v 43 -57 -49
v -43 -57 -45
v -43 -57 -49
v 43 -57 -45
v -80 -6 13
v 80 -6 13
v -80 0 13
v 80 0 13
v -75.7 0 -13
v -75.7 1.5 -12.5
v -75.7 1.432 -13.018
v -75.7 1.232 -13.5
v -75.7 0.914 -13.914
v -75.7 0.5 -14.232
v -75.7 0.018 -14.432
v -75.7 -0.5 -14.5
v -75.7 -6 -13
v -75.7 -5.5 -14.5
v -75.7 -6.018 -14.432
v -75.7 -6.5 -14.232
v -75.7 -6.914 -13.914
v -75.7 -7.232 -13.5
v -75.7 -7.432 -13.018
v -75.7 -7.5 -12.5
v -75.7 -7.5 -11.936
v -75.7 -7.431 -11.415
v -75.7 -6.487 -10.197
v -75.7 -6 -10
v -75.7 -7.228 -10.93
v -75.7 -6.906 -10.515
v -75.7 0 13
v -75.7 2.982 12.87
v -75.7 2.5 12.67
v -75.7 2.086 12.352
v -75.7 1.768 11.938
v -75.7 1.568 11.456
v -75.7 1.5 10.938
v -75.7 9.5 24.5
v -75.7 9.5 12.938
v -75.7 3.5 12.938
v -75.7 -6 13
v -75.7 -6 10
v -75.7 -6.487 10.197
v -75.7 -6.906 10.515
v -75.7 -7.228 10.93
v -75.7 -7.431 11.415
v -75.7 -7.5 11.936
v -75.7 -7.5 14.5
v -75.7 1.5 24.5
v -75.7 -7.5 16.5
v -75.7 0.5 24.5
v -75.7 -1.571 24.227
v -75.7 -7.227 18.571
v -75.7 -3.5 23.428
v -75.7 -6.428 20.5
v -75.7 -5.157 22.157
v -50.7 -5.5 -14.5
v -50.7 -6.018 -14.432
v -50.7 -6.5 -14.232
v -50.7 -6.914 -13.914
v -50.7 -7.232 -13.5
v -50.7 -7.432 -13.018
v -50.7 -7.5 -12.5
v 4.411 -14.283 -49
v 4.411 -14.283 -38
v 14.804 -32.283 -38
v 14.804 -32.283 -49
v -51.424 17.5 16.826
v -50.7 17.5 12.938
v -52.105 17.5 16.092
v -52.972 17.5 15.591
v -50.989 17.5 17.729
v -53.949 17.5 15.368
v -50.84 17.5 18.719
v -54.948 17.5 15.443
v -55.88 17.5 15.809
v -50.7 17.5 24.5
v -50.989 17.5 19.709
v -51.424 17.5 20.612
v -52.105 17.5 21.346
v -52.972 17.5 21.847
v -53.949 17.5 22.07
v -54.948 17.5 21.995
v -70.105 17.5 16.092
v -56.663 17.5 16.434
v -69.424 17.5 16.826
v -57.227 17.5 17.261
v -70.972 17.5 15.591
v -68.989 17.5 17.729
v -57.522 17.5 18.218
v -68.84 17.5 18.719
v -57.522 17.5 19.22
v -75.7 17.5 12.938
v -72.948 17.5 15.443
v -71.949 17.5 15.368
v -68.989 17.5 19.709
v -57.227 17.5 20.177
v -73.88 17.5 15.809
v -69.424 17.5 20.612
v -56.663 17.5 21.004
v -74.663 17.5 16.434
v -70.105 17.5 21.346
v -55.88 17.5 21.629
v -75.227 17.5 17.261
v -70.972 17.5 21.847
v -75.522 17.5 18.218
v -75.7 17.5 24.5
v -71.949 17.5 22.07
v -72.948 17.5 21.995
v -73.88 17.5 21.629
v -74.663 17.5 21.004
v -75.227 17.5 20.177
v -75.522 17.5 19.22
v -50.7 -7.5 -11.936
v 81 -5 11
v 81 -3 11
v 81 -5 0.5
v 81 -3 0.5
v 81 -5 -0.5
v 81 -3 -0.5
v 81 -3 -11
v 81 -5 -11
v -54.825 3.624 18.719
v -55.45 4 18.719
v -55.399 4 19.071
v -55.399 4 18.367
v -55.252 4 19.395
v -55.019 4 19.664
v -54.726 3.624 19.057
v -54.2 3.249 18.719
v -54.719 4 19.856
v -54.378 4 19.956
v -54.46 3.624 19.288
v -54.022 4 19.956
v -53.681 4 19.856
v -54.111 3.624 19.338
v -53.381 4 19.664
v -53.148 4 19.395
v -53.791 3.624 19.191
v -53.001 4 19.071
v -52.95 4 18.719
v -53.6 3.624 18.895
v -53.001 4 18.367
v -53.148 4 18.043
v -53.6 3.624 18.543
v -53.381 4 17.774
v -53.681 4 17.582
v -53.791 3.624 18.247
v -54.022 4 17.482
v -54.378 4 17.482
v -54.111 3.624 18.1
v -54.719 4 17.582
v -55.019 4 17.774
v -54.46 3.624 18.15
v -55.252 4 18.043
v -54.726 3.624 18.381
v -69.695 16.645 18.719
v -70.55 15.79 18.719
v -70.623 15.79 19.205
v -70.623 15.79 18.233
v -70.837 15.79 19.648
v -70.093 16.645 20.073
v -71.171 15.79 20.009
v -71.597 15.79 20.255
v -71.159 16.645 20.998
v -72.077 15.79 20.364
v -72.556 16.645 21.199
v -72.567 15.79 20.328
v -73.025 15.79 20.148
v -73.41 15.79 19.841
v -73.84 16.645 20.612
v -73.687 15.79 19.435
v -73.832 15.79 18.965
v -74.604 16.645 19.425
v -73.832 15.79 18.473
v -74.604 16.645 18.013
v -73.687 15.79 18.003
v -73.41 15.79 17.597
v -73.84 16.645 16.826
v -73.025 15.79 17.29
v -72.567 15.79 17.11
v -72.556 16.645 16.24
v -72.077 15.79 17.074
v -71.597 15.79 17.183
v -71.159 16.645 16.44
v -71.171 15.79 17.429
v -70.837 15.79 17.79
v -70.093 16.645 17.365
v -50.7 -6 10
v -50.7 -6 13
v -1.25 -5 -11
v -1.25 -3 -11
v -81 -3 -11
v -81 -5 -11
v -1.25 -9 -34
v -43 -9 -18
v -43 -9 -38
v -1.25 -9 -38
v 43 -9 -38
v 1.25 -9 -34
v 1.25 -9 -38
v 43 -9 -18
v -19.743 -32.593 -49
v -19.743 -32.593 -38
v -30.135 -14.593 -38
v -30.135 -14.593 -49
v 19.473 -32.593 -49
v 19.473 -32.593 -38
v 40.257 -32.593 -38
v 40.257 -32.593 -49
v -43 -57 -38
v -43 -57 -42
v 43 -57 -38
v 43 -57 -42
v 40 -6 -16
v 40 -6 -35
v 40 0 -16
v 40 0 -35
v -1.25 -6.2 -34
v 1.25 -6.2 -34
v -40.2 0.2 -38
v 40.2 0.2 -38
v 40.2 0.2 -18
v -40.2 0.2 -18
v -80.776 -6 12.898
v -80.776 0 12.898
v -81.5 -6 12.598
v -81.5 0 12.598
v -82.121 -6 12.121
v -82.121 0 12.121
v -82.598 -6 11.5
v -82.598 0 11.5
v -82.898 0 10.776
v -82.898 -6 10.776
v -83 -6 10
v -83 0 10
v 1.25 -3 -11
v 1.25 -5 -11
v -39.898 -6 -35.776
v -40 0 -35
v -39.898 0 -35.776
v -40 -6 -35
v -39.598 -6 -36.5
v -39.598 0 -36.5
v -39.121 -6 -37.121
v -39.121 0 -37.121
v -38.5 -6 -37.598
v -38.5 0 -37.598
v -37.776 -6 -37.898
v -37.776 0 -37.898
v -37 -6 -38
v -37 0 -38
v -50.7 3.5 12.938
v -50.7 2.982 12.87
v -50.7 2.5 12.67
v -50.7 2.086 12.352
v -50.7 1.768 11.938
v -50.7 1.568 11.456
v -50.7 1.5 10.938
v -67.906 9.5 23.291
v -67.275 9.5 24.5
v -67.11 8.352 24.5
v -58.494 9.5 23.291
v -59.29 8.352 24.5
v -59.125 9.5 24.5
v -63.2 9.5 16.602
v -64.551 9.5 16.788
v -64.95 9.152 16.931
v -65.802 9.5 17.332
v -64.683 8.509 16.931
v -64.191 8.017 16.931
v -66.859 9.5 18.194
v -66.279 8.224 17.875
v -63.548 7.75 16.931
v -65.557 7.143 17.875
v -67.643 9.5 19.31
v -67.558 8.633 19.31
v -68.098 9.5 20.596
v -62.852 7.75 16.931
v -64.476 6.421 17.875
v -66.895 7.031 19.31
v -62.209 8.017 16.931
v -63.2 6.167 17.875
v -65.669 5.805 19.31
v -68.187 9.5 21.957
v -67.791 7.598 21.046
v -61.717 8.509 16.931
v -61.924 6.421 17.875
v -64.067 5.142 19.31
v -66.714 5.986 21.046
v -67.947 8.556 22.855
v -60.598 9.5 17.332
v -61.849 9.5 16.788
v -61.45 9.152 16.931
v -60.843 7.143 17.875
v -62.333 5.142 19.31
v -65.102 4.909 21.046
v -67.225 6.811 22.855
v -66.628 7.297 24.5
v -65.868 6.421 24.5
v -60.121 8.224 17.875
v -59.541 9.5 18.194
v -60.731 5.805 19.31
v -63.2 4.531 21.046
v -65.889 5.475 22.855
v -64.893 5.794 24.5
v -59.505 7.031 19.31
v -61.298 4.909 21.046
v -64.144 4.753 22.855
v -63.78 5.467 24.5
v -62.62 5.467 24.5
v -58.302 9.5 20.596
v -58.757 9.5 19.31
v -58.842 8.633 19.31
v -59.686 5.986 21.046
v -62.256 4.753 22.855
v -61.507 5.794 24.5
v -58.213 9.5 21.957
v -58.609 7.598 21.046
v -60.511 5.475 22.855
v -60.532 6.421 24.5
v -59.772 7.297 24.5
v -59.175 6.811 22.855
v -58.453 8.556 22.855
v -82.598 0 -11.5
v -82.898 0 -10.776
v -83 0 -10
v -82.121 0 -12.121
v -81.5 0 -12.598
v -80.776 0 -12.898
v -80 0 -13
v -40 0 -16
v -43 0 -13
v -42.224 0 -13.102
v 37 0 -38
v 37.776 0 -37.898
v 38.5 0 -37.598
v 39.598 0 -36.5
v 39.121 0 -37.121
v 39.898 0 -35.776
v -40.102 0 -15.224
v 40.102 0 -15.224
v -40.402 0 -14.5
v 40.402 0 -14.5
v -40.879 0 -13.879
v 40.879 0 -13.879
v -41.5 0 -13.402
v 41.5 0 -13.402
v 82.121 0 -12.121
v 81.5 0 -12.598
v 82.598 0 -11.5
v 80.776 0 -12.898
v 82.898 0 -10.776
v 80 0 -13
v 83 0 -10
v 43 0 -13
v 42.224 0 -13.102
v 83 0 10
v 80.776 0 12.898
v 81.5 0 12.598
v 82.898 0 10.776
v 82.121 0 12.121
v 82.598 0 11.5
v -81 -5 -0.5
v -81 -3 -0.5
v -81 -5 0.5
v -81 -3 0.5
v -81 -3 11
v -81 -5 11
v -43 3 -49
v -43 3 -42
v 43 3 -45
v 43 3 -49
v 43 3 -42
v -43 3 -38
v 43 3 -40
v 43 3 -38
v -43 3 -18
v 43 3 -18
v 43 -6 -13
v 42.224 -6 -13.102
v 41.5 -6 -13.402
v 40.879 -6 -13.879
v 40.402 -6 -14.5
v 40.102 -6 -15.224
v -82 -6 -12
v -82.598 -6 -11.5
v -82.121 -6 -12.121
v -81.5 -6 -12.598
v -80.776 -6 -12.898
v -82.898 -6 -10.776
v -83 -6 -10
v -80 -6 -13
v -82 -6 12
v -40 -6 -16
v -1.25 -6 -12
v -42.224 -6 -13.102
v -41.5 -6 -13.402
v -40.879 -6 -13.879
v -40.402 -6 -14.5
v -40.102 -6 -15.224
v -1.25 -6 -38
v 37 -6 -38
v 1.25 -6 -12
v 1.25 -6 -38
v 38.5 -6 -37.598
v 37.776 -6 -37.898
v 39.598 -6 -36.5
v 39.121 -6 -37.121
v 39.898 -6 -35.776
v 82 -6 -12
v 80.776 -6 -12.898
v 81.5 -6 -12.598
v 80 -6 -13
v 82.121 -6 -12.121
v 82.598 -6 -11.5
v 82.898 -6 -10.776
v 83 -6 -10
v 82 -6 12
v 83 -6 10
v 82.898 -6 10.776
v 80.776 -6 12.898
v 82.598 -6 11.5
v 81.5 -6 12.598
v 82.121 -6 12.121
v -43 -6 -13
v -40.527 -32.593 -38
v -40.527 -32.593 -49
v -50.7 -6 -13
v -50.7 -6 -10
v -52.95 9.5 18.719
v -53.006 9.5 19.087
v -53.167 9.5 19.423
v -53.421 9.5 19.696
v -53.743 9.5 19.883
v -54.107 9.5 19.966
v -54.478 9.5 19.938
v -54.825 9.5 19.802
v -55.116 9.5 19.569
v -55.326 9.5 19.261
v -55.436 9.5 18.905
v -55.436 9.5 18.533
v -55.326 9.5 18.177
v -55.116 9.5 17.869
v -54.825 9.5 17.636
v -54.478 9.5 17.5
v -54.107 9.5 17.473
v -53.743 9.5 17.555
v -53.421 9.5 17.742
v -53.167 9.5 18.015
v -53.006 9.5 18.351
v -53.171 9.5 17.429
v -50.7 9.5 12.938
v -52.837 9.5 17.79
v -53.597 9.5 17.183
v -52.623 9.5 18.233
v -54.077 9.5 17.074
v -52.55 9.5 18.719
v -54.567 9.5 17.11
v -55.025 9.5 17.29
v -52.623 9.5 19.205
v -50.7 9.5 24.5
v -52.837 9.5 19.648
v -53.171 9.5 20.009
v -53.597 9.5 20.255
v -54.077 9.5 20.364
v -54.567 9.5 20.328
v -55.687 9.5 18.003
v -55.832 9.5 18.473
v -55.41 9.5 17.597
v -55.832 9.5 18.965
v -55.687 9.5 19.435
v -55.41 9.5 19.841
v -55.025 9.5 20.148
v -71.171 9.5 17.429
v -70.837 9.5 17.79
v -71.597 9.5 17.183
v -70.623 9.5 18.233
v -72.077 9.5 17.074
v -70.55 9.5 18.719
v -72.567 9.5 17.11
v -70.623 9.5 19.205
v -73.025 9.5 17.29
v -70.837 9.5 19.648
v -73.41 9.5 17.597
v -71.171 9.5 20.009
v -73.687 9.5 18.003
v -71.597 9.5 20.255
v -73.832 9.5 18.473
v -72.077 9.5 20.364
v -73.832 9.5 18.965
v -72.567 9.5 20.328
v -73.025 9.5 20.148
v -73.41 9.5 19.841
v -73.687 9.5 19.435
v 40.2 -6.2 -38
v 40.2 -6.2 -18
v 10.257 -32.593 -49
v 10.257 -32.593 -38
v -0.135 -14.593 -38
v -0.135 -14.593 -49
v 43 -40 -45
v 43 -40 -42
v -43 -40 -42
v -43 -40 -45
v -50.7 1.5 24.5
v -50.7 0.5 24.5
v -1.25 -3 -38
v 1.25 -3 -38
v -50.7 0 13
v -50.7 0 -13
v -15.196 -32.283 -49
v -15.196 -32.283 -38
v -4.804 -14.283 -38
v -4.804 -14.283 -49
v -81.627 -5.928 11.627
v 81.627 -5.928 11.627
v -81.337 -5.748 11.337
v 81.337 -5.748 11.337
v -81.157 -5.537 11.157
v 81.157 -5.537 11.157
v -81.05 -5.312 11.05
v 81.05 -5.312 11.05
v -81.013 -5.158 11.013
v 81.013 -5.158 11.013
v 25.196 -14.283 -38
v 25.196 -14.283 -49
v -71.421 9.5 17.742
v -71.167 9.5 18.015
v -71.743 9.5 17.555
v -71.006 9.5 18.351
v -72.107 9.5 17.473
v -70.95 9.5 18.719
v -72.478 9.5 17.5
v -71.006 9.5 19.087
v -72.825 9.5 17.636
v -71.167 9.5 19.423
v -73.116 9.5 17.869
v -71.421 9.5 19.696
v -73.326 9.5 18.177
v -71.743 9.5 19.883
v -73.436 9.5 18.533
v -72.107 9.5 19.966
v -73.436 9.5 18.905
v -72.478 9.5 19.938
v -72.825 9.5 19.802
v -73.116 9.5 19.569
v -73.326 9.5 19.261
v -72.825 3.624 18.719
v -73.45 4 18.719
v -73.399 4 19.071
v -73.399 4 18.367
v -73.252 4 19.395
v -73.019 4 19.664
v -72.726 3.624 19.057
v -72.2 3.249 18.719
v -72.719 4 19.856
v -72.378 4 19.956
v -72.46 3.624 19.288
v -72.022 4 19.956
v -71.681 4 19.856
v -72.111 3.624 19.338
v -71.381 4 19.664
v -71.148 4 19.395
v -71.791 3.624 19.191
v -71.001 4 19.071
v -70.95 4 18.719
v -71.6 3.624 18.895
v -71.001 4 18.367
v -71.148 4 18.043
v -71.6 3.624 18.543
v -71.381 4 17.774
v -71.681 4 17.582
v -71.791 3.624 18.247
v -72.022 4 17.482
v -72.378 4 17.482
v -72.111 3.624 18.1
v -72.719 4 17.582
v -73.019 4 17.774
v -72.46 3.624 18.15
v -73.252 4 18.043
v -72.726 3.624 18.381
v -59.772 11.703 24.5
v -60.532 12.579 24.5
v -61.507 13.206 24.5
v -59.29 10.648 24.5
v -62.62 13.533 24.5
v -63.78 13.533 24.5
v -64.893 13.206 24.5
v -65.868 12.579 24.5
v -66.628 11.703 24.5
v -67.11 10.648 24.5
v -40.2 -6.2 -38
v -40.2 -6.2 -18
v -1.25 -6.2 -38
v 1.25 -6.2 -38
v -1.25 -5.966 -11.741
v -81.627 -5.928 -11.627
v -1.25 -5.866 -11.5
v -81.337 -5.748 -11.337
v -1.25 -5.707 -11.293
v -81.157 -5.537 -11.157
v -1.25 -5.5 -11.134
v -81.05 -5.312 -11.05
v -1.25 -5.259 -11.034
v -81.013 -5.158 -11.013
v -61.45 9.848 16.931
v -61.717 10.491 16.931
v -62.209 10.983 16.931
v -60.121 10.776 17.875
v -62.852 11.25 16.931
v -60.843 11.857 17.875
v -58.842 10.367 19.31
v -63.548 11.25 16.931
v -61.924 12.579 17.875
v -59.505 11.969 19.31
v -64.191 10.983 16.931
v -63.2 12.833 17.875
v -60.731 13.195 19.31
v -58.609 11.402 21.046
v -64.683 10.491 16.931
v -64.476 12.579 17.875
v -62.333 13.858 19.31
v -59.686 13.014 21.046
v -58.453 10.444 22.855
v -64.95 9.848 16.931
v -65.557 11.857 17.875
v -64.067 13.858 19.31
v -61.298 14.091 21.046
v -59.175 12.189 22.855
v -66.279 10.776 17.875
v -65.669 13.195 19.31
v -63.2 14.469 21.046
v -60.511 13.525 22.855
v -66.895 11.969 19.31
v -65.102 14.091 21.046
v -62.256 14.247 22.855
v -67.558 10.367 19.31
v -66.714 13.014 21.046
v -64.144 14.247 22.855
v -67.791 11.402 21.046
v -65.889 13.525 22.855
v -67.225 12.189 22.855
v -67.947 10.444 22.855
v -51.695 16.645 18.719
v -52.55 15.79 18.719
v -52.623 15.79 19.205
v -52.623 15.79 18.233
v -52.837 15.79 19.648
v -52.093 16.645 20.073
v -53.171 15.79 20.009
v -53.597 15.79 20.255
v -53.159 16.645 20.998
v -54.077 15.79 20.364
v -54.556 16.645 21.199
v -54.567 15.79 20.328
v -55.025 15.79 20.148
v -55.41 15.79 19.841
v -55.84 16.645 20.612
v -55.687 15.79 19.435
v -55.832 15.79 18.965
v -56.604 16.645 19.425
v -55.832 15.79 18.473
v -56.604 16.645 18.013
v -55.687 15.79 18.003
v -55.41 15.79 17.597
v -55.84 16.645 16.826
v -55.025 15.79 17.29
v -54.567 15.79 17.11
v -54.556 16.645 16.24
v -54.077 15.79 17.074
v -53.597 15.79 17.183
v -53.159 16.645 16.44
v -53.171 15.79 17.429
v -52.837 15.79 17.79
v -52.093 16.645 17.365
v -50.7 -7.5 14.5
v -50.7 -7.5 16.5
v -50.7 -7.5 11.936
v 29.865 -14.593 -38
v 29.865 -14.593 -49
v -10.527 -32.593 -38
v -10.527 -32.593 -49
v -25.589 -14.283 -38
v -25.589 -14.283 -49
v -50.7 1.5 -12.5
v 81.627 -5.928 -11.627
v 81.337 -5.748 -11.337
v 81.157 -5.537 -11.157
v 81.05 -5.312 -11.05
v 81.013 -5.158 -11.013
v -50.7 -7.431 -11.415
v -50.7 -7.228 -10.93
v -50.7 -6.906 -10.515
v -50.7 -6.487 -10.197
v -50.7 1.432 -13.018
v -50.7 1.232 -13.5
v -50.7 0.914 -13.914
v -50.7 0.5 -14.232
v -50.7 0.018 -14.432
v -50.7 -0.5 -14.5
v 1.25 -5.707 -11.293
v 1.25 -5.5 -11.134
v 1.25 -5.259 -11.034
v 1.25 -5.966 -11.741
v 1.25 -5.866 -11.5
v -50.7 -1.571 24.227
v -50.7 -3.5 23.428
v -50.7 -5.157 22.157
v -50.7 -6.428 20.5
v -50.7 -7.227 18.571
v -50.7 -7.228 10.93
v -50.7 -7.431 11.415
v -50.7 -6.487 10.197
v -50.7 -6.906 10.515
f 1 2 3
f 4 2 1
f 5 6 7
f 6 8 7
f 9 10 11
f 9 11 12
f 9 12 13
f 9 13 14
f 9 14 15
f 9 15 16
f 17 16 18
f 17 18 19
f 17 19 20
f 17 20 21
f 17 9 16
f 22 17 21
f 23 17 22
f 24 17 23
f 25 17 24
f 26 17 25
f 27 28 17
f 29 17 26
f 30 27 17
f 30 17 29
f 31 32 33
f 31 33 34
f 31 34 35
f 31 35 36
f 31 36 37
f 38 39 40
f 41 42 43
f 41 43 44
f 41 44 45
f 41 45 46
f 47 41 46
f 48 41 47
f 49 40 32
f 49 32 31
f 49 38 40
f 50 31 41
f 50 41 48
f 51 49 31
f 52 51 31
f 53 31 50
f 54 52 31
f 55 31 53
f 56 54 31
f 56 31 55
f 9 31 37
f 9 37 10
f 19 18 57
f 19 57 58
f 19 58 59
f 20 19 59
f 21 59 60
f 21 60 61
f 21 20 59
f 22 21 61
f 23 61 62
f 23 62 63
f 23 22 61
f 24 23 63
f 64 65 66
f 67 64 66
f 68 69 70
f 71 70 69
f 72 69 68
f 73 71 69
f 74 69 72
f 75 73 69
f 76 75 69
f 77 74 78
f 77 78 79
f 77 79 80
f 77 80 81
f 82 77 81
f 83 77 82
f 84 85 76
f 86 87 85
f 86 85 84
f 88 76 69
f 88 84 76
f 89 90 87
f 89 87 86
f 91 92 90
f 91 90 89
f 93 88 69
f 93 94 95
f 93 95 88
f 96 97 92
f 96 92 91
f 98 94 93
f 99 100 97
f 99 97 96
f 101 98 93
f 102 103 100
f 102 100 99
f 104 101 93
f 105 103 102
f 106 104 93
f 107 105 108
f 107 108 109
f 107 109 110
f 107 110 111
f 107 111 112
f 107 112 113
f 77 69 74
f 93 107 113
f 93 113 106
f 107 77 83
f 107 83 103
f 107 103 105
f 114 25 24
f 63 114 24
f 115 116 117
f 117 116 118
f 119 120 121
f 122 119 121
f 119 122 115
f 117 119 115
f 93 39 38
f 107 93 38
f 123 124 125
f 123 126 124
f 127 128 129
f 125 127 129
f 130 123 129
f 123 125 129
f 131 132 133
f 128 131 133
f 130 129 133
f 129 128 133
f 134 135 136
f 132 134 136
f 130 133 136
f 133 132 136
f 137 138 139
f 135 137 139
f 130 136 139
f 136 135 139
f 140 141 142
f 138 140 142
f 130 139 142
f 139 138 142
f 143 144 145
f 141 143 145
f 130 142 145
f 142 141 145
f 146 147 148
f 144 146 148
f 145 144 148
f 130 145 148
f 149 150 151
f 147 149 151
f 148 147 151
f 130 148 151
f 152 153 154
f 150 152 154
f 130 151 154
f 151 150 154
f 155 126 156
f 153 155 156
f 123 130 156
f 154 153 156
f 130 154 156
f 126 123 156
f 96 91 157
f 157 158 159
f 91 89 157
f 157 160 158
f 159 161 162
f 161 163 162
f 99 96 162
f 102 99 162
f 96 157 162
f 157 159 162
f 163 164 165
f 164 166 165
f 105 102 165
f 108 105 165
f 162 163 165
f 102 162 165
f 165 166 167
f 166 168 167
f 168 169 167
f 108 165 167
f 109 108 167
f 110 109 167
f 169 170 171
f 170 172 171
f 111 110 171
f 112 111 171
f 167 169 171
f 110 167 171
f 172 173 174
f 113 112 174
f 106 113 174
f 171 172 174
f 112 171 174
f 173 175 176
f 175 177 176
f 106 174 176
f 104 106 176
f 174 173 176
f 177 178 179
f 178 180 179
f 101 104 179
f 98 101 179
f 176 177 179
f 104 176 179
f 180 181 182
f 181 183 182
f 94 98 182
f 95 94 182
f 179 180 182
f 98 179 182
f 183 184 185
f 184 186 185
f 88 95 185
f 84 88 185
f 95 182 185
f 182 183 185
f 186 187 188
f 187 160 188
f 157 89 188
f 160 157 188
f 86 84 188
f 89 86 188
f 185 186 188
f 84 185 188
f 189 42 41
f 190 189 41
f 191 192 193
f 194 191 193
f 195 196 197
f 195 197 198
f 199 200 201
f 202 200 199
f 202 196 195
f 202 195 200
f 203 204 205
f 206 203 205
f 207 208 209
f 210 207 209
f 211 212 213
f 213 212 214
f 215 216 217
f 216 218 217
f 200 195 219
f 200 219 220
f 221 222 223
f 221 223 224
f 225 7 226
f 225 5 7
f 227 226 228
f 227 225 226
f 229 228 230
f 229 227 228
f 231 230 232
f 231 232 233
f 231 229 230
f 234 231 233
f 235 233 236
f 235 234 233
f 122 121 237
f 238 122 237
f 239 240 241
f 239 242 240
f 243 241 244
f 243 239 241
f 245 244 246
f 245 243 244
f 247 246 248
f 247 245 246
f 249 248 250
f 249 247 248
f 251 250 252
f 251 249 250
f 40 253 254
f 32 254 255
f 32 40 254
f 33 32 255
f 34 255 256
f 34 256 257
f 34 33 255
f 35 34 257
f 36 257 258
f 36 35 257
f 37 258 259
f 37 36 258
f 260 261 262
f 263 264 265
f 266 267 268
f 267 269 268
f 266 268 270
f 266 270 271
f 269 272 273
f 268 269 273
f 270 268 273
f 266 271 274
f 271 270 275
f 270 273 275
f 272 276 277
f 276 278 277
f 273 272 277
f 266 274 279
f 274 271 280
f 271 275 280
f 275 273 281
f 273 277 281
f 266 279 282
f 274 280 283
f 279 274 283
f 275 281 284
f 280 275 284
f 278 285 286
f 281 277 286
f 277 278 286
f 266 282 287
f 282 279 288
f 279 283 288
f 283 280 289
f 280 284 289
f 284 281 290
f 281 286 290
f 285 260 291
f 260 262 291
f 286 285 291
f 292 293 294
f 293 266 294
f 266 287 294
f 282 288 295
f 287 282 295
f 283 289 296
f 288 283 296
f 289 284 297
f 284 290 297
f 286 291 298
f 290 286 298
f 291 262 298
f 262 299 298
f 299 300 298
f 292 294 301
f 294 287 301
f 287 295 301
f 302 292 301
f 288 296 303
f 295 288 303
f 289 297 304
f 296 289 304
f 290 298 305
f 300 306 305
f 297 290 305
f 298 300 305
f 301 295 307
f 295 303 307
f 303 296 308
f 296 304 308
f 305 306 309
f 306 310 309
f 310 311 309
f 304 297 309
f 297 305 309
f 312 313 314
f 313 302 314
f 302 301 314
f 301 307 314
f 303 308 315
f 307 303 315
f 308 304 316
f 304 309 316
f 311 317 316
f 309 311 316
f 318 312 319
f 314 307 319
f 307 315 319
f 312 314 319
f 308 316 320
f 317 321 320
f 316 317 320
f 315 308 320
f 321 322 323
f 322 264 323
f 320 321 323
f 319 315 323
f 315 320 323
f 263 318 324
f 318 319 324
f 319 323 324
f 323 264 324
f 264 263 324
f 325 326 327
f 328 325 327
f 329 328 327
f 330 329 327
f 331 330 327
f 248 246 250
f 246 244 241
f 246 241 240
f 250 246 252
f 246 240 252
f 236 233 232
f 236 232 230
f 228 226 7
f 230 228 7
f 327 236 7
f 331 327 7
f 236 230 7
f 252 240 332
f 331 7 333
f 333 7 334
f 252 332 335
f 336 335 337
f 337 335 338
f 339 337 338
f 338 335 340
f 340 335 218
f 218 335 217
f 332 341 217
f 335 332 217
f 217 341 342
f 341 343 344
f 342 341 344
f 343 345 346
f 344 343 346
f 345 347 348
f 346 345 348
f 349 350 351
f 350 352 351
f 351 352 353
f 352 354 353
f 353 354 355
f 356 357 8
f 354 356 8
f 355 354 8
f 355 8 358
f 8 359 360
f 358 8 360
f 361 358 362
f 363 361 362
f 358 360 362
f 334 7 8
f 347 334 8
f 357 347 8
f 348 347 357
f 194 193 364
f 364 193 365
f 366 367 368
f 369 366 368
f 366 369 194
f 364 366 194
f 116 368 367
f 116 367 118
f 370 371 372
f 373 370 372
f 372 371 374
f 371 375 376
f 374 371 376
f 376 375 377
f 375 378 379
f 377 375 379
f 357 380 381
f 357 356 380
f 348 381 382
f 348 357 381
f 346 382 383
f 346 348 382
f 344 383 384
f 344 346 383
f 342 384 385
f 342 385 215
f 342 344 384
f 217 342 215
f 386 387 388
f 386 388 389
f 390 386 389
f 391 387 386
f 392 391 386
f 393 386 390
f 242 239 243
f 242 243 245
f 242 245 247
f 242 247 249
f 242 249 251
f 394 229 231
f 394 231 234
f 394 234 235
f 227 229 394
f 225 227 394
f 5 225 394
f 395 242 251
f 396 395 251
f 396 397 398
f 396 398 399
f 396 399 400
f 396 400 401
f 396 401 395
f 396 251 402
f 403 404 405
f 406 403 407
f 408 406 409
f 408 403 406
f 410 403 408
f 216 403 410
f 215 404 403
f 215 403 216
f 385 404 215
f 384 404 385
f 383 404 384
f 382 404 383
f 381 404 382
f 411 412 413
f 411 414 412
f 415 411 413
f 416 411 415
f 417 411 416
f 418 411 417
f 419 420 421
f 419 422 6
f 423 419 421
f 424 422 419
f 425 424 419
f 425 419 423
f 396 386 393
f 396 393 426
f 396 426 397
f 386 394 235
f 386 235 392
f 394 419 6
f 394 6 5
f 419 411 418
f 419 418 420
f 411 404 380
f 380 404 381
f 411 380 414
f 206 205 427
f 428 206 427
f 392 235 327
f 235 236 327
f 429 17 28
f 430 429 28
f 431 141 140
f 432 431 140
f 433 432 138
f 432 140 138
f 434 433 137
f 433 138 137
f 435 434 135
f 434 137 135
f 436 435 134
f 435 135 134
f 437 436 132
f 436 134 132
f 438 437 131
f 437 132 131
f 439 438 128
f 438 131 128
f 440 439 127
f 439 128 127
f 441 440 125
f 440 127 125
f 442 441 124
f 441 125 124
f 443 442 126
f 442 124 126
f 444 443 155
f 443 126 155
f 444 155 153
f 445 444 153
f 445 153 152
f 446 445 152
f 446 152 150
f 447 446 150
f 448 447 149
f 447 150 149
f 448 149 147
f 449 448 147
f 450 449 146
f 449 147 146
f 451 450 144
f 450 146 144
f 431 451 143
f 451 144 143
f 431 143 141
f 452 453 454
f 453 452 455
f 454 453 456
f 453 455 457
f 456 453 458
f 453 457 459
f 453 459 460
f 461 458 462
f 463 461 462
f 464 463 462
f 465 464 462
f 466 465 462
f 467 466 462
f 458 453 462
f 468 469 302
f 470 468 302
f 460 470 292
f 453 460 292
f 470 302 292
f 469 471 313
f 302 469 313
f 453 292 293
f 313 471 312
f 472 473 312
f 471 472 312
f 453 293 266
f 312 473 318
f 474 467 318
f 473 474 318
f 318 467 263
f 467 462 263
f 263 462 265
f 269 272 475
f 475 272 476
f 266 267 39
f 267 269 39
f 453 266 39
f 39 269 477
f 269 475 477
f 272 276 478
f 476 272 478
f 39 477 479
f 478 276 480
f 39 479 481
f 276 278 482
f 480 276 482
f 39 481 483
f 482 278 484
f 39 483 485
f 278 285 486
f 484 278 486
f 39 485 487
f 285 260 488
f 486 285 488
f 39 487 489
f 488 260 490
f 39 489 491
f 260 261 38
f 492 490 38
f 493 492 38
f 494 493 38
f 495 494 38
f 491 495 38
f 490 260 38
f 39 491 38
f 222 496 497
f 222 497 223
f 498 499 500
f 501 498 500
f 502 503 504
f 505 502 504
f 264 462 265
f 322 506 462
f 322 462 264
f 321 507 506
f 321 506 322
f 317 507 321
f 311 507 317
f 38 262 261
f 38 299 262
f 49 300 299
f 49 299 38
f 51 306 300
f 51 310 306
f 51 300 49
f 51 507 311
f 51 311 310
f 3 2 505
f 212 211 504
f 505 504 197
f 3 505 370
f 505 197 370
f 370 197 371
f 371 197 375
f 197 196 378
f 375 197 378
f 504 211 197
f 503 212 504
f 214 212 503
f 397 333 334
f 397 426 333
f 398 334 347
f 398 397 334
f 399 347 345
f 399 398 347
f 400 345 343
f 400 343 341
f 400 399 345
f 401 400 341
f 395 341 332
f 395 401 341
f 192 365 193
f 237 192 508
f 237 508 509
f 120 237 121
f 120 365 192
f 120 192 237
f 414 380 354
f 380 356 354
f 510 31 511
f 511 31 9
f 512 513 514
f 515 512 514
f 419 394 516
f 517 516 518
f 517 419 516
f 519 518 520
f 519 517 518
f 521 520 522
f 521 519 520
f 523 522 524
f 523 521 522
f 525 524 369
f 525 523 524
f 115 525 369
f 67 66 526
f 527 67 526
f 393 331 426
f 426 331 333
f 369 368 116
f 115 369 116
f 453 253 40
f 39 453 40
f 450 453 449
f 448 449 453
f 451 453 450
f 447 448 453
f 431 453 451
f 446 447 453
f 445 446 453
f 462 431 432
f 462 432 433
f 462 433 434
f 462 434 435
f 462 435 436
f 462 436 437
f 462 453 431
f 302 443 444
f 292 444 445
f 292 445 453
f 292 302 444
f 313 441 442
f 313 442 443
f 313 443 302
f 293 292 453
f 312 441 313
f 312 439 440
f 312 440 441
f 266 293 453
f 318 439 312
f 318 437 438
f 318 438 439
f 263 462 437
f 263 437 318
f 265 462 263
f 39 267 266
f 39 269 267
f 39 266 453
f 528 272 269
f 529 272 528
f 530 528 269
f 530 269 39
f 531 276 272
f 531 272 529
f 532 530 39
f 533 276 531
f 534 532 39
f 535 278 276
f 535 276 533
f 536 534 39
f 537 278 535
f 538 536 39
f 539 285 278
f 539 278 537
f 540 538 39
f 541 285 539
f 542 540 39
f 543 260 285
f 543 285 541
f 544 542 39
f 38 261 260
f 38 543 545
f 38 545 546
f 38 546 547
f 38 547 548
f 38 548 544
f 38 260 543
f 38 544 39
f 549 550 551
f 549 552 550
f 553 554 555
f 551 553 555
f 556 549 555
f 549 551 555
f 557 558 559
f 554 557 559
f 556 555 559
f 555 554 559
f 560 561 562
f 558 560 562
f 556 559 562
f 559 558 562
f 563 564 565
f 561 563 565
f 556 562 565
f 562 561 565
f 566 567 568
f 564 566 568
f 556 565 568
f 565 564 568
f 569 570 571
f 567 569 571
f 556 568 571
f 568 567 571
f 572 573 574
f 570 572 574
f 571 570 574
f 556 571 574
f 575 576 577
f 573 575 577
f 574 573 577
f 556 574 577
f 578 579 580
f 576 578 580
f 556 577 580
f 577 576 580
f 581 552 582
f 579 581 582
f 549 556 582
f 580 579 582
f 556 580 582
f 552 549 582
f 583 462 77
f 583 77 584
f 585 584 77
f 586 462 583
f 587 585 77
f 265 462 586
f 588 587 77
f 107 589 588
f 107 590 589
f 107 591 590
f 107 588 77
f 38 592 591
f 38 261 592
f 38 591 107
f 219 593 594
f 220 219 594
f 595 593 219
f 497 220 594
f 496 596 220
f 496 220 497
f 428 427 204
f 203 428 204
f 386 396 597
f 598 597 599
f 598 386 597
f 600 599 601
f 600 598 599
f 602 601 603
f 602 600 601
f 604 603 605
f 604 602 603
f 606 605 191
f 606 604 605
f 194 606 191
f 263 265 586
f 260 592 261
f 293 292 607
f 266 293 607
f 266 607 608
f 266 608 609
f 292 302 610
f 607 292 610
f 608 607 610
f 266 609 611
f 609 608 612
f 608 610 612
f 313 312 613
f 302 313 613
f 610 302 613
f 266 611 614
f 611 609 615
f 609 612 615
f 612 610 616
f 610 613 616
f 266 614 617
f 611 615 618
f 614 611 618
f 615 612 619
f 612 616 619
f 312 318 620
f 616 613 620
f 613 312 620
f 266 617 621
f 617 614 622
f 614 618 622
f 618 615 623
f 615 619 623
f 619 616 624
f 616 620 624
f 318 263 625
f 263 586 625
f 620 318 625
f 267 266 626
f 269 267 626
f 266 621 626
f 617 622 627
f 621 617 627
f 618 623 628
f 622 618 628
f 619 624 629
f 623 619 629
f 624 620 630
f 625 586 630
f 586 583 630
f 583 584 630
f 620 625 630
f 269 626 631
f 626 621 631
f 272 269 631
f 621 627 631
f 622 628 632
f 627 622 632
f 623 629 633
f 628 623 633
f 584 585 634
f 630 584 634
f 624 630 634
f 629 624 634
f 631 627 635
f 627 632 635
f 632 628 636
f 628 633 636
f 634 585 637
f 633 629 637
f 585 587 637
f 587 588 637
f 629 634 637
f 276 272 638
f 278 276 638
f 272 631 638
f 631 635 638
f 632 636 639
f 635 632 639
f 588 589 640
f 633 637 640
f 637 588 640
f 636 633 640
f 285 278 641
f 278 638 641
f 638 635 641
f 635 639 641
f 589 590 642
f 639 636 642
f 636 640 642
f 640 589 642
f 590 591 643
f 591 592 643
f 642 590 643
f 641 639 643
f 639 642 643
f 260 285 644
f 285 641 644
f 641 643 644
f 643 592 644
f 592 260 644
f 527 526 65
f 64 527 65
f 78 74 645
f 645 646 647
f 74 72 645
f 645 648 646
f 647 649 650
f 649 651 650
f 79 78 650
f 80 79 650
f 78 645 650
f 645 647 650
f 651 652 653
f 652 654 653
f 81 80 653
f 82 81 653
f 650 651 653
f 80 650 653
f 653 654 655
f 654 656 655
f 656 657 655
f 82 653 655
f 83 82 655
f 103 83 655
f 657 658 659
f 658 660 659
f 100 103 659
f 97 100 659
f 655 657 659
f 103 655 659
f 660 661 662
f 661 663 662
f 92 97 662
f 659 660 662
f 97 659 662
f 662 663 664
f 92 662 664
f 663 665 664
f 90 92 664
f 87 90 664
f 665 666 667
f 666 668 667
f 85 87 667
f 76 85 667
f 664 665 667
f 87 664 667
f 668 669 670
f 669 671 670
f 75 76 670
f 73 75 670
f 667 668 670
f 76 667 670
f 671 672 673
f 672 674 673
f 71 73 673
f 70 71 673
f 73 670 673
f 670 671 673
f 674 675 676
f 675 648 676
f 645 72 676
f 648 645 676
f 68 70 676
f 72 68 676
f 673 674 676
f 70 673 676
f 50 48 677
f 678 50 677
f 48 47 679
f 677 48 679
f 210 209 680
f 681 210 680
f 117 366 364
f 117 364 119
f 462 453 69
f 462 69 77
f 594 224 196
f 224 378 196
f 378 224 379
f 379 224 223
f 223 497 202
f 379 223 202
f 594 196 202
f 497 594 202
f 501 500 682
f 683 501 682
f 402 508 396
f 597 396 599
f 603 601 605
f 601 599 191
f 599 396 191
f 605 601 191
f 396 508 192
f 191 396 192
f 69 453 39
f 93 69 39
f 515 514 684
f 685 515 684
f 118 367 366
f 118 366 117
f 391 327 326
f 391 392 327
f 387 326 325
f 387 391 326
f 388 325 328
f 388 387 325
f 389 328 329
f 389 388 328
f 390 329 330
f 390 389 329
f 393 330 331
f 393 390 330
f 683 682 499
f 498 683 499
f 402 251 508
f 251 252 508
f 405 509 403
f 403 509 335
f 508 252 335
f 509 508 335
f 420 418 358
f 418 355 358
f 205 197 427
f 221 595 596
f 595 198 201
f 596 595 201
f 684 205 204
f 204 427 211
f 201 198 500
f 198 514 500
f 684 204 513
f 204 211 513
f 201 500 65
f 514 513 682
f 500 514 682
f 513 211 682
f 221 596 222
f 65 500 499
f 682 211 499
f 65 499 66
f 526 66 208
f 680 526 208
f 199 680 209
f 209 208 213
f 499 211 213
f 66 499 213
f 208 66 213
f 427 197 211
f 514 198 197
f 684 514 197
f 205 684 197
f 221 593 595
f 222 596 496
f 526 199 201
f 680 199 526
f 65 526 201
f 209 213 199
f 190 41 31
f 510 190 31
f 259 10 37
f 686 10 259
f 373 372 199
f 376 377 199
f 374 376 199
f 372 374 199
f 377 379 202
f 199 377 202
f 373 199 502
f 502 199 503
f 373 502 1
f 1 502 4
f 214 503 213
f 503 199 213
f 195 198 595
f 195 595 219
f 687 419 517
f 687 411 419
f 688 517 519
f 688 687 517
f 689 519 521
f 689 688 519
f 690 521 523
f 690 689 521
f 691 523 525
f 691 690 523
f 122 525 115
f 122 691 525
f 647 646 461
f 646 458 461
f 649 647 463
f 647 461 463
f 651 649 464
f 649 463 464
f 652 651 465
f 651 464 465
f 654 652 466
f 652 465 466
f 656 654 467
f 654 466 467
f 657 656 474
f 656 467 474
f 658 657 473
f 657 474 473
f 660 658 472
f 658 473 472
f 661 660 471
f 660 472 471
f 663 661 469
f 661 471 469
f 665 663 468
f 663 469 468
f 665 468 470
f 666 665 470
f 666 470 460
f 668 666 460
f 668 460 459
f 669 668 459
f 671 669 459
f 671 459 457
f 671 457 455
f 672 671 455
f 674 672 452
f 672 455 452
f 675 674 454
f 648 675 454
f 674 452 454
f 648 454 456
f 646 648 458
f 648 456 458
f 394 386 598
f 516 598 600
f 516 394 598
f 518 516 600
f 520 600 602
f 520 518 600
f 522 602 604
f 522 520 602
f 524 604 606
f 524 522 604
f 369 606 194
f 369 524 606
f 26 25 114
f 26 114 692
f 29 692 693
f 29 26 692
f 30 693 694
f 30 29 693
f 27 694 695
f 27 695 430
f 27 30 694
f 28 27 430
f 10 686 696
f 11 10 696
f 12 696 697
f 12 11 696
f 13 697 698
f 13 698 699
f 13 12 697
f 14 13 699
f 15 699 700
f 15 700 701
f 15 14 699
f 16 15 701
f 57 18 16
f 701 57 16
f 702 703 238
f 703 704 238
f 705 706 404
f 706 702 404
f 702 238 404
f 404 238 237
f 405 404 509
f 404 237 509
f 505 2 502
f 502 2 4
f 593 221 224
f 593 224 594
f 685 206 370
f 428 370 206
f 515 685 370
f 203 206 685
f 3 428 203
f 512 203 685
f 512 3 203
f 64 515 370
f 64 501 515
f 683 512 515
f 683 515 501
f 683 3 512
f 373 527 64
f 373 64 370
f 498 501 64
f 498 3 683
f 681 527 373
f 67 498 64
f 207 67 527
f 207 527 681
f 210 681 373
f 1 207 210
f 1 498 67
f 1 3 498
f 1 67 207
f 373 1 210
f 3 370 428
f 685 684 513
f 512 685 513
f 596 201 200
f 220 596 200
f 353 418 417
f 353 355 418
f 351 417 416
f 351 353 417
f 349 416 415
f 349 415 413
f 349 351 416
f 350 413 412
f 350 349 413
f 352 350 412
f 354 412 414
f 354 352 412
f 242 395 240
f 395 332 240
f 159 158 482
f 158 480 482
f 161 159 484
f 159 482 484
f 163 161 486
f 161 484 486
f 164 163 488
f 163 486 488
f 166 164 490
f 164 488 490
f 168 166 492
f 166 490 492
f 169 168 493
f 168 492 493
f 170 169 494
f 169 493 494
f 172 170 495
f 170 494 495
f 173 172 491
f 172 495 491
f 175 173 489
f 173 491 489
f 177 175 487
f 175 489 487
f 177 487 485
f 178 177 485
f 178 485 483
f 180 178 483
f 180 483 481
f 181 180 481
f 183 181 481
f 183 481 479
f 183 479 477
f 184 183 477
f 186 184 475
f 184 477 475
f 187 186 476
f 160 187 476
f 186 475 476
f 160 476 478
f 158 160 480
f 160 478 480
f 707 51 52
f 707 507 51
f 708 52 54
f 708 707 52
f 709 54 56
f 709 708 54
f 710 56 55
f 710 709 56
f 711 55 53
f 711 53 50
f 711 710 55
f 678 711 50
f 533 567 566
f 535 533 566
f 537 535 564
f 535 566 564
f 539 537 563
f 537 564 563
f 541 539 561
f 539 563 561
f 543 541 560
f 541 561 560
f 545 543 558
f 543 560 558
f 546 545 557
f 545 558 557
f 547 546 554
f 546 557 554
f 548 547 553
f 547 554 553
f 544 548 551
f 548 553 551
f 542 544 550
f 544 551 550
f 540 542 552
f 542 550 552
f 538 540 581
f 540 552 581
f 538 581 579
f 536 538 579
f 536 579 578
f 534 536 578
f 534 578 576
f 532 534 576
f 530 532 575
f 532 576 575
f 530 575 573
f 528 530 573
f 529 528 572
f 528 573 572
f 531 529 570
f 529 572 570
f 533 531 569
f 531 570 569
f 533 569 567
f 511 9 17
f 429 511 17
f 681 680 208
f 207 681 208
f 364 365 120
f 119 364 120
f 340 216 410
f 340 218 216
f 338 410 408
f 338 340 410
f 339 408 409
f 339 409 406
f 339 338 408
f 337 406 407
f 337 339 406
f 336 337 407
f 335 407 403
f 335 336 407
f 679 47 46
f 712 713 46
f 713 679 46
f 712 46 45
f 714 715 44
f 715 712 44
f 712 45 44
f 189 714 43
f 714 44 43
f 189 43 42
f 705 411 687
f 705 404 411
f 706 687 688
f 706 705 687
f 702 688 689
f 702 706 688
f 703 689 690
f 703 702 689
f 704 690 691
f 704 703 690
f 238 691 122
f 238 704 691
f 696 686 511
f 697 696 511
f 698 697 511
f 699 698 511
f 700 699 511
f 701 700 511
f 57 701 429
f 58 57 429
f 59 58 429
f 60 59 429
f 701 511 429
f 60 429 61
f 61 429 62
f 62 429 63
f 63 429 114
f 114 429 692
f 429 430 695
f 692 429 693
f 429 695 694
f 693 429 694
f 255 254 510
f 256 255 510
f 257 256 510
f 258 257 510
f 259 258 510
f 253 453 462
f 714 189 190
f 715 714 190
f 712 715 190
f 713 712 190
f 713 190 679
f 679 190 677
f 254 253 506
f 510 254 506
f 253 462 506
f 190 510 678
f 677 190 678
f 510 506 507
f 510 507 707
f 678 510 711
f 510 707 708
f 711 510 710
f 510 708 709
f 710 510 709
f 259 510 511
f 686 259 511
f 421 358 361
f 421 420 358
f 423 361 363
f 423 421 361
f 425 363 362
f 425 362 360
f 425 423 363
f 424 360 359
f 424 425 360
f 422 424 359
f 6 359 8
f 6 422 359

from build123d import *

# Parameters (mm, degrees)
F0_W              = 80
F0_H              = 25
F1_DEPTH          = 3
F3_DEPTH          = 3
F4_W              = 162
F4_H              = 1
F5_DEPTH          = 2
F6_R              = 3
F7_R              = 0.99999
F9_DEPTH          = 20
F10_W             = 85.9999992251
F10_H             = 11.9999992251
F11_DEPTH         = 2
F12_W             = 2.5
F12_H             = 4
F13_DEPTH         = 4
F14_W             = 85.9999992251
F14_H             = 60
F15_DEPTH         = 2
F17_DEPTH         = 3
F18_W             = 85.9999992251
F18_H             = 42.9999996126
F18_H_2           = 17.0000003874
F19_DEPTH         = 4
F21_DEPTH         = 50
F23_DEPTH         = 25
F25_W             = 25
F25_H             = 8.9999996647
F26_DEPTH         = 10
F27_W             = 25
F27_H             = 11.5619772188
F28_DEPTH         = 8
F31_W             = 25
F31_H             = 11.5619772188
F32_DEPTH         = 8
F34_R             = 8
F35_T1_DEPTH      = 25
F35_T3_DEPTH      = 34.6824581491
F35_T5_DEPTH      = 35
F35_T7_DEPTH      = 35
F35_T9_DEPTH      = 34.6824581491
F37_D             = 2.5
F37_DEPTH         = 13.5
F37_CSINK_D       = 6.72
F37_CSINK_ANGLE   = 90
F37_TIP           = 0.7510757738
F37_2_D           = 2.5
F37_2_DEPTH       = 13.5
F37_2_CSINK_D     = 6.72
F37_2_CSINK_ANGLE = 90
F37_2_TIP         = 0.7510757738
F38_D             = 3.3
F38_DEPTH         = 13.5
F38_CSINK_D       = 6.72
F38_CSINK_ANGLE   = 90
F38_TIP           = 0.9914200214


# Not quite as in the source:
# - a fillet or chamfer that OpenCascade refuses, or shapes differently, is made with other operations: its cross-section is extruded or revolved along the edge and cut away or added
# - a fillet or chamfer is up to 0.001 mm smaller than in the source, because OpenCascade refuses the exact size


with BuildPart() as f1:
    # F0 (on Front) → F1 (new body)
    with BuildSketch(Plane.XZ):
        Polygon((40, -13), (83, -13), (83, 13), (-83, 13), (-83, -13), (-40, -13), align=None)
        with Locations((0, -25.5)):
            Rectangle(F0_W, F0_H)
    extrude(amount=F1_DEPTH)

    # F2 (on face) → F3 (join)
    with BuildSketch(Plane.XZ.offset(3)):
        Polygon((83, -13), (83, 13), (-83, 13), (-83, -13), (-40, -13), (-40, -38), (-1.25, -38), (-1.25, -11), (-40, -11), (-81, -11), (-81, 11), (81, 11), (81, -11), (40, -11), (1.25, -11), (1.25, -38), (40, -38), (40, -13), align=None)
    extrude(amount=F3_DEPTH)

    # F4 (on face) → F5 (join)
    with BuildSketch(Plane.XZ.offset(3)):
        Rectangle(F4_W, F4_H)
    extrude(amount=F5_DEPTH)

    # F6
    f6_edges = [f1.edges().sort_by_distance(p)[0] for p in [
        (83, -3, 13),
        (83, -3, -13),
        (40, -3, -13),
        (-40, -3, -13),
        (-83, -3, -13),
        (-83, -3, 13),
        (40, -3, -38),
        (-40, -3, -38),
    ]]
    fillet(f6_edges, radius=F6_R)

    # F7 (radius 1 in the source; OpenCascade refuses exactly that, so slightly less here)
    f7_edges = [f1.edges().sort_by_distance(p)[0] for p in [
        (0, -6, 11),
        (-81, -6, 0),
        (-41.125, -6, -11),
        (41.125, -6, -11),
        (81, -6, 0),
    ]]
    fillet(f7_edges, radius=F7_R)


with BuildPart() as f9:
    # F8 (on face) → F9 (new body)
    with BuildSketch(Plane(origin=(0, 0, -38), x_dir=(1, 0, 0), z_dir=(0, 0, -1))):
        Polygon((37, 8.9999996126), (1.25, 8.9999996126), (-1.25, 8.9999996126), (-37, 8.9999996126), (-42.9999996126, 8.9999996126), (-42.9999996126, -2.9999996126), (-37, -2.9999996126), (37, -2.9999996126), (42.9999996126, -2.9999996126), (42.9999996126, 8.9999996126), align=None)
        Polygon((-40.2, 6.2), (-37, 6.2), (-1.25, 6.2), (1.25, 6.2), (37, 6.2), (40.2, 6.2), (40.2, -0.2), (37, -0.2), (-37, -0.2), (-40.2, -0.2), align=None, mode=Mode.SUBTRACT)
    extrude(amount=-F9_DEPTH)

    # F10 (on face) → F11 (join)
    with BuildSketch(Plane(origin=(0, 0, -38), x_dir=(1, 0, 0), z_dir=(0, 0, -1))):
        with Locations((0, 3)):
            Rectangle(F10_W, F10_H)
    extrude(amount=F11_DEPTH)

    # F12 (on face) → F13 (cut)
    with BuildSketch(Plane.XZ.offset(8.9999996126)):
        with Locations((0, -36)):
            Rectangle(F12_W, F12_H)
    extrude(amount=-F13_DEPTH, mode=Mode.SUBTRACT)

    # F14 (on face) → F15 (join, symmetric)
    with BuildSketch(Plane(origin=(0, 0, -40), x_dir=(1, 0, 0), z_dir=(0, 0, -1))):
        with Locations((0, 27.0000003874)):
            Rectangle(F14_W, F14_H)
    extrude(amount=F15_DEPTH, both=True)

    # F16 (on face) → F17 (join)
    with BuildSketch(Plane(origin=(0, 0, -42), x_dir=(1, 0, 0), z_dir=(0, 0, -1))):
        Polygon((-42.9999996126, 40), (-42.9999996126, 3.874e-07), (-42.9999996126, -2.9999996126), (42.9999996126, -2.9999996126), (42.9999996126, 0), (42.9999996126, 40), align=None)
    extrude(amount=F17_DEPTH)

    # F18 (on face) → F19 (join)
    with BuildSketch(Plane(origin=(0, 0, -45), x_dir=(1, 0, 0), z_dir=(0, 0, -1))):
        with Locations((0, 18.5000001937)):
            Rectangle(F18_W, F18_H)
        with Locations((0, 48.5000001937)):
            Rectangle(F18_W, F18_H_2)
    extrude(amount=F19_DEPTH)

    # F20 (on face) → F21 (cut)
    with BuildSketch(Plane.XY.offset(-38)):
        Polygon((-40.527221151, -32.5934187919), (-19.7426114601, -32.5934187919), (-30.1349163055, -14.5934187919), align=None)
        Polygon((-10.527221151, -32.5934187919), (10.2573885399, -32.5934187919), (-0.1349163055, -14.5934187919), align=None)
        Polygon((19.472778849, -32.5934187919), (40.2573885399, -32.5934187919), (29.8650836945, -14.5934187919), align=None)
        Polygon((-4.8039347303, -14.2831178904), (-25.5885444212, -14.2831178904), (-15.1962395757, -32.2831178904), align=None)
        Polygon((25.1960652697, -14.2831178904), (4.4114555788, -14.2831178904), (14.8037604243, -32.2831178904), align=None)
    extrude(amount=-F21_DEPTH, mode=Mode.SUBTRACT)


with BuildPart() as f23:
    # F22 (on Right) → F23 (new body)
    with BuildSketch(Plane.YZ):
        Polygon((-6, 13), (0, 13), (0, 10), (0, -10), (0, -13), (-6, -13), (-6, -10), (-7.4999998324, -10), (-7.4999998324, -14.4999998324), (1.4999998324, -14.4999998324), (1.4999998324, -10), (1.4999998324, 10), (1.4999998324, 14.4999998324), (-7.4999998324, 14.4999998324), (-7.4999998324, 10), (-6, 10), align=None)
    extrude(amount=F23_DEPTH)


with BuildPart() as f23_1:
    # F24: moved
    add(f23.part.moved(Location((-75.7, 0, 0))))

    # F25 (on face) → F26 (join)
    with BuildSketch(Plane.XY.offset(14.4999998324)):
        with Locations((-63.2, -3)):
            Rectangle(F25_W, F25_H)
    extrude(amount=F26_DEPTH)

    # F27 (on face) → F28 (join)
    with BuildSketch(Plane(origin=(0, 1.4999998324, 0), x_dir=(-1, 0, 0), z_dir=(0, 1, 0))):
        with Locations((63.2, 18.7190112229)):
            Rectangle(F27_W, F27_H)
    extrude(amount=F28_DEPTH)


with BuildPart() as f30:
    # F29 (on face) → F30 (revolve)
    with BuildSketch(Plane(origin=(0, 9.4999998324, 0), x_dir=(-1, 0, 0), z_dir=(0, 1, 0))):
        with BuildLine():
            Line((63.2, 24.4999998324), (63.2, 16.6022711247))
            ThreePointArc((63.2, 16.6022711247), (67.6434583118, 19.3097445205), (67.2746985578, 24.4999998324))
            Line((67.2746985578, 24.4999998324), (63.2, 24.4999998324))
        make_face()
    revolve(axis=Axis((-63.2, 9.4999998324, 21.6022711247), (0, 0, 1)))


with BuildPart() as f32:
    # F31 (on face) → F32 (new body)
    with BuildSketch(Plane(origin=(0, 9.4999998324, 0), x_dir=(-1, 0, 0), z_dir=(0, 1, 0))):
        with Locations((63.2, 18.7190112229)):
            Rectangle(F31_W, F31_H)
    extrude(amount=F32_DEPTH)

    # F33: cut F30
    add(f30.part, mode=Mode.SUBTRACT)

    # F37#2
    with Locations(Plane(origin=(0, 17.4999998324, 0), x_dir=(-1, 0, 0), z_dir=(0, 1, 0))):
        with Locations((54.2, 18.7190112229), (72.2, 18.7190112229)):
            CounterSinkHole(F37_2_D / 2, F37_2_CSINK_D / 2, depth=F37_2_DEPTH, counter_sink_angle=F37_2_CSINK_ANGLE)
            with Locations((0, 0, -(F37_2_DEPTH + F37_2_TIP / 2))):  # 118° drill point
                Cone(0, F37_2_D / 2, F37_2_TIP, mode=Mode.SUBTRACT)

    # F38
    with Locations(Plane(origin=(0, 17.4999998324, 0), x_dir=(-1, 0, 0), z_dir=(0, 1, 0))):
        with Locations((54.2, 18.7190112229), (72.2, 18.7190112229)):
            CounterSinkHole(F38_D / 2, F38_CSINK_D / 2, depth=F38_DEPTH, counter_sink_angle=F38_CSINK_ANGLE)
            with Locations((0, 0, -(F38_DEPTH + F38_TIP / 2))):  # 118° drill point
                Cone(0, F38_D / 2, F38_TIP, mode=Mode.SUBTRACT)


with BuildPart() as f23_2:
    add(f23_1.part)

    # F33: cut F30
    add(f30.part, mode=Mode.SUBTRACT)

    # F34
    f34_edges = [f23_2.edges().sort_by_distance(p)[0] for p in [
        (-63.2, -7.5, 24.5),
    ]]
    fillet(f34_edges, radius=F34_R)

    # F35: fillet of radius 2 on 5 edges, made by hand

    # F35_s2 → F35_t1 (join)
    with BuildSketch(Plane.YZ.offset(-75.7)):
        with BuildLine():
            ThreePointArc((3.4999998324, 12.9380226135), (2.08578627, 12.3522361759), (1.4999998324, 10.9380226135))
            Line((1.4999998324, 10.9380226135), (1.4999998324, 12.9380226135))
            Line((1.4999998324, 12.9380226135), (3.4999998324, 12.9380226135))
        make_face()
    extrude(amount=F35_T1_DEPTH)

    # F35_s4 → F35_t3 (cut)
    with BuildSketch(Plane.YZ.offset(-80.5412290745)):
        with BuildLine():
            ThreePointArc((-7.4999998324, 11.9364916298), (-7.0811387155, 10.7117468269), (-6, 10))
            Line((-6, 10), (-7.4999998324, 10))
            Line((-7.4999998324, 10), (-7.4999998324, 11.9364916298))
        make_face()
    extrude(amount=F35_T3_DEPTH, mode=Mode.SUBTRACT)

    # F35_s6 → F35_t5 (cut)
    with BuildSketch(Plane.YZ.offset(-80.7)):
        with BuildLine():
            ThreePointArc((1.4999998324, -12.4999998324), (0.9142133947, -13.9142133947), (-0.5000001676, -14.4999998324))
            Line((-0.5000001676, -14.4999998324), (1.4999998324, -14.4999998324))
            Line((1.4999998324, -14.4999998324), (1.4999998324, -12.4999998324))
        make_face()
    extrude(amount=F35_T5_DEPTH, mode=Mode.SUBTRACT)

    # F35_s8 → F35_t7 (cut)
    with BuildSketch(Plane.YZ.offset(-80.7)):
        with BuildLine():
            ThreePointArc((-5.4999998324, -14.4999998324), (-6.9142133947, -13.9142133947), (-7.4999998324, -12.4999998324))
            Line((-7.4999998324, -12.4999998324), (-7.4999998324, -14.4999998324))
            Line((-7.4999998324, -14.4999998324), (-5.4999998324, -14.4999998324))
        make_face()
    extrude(amount=F35_T7_DEPTH, mode=Mode.SUBTRACT)

    # F35_s10 → F35_t9 (cut)
    with BuildSketch(Plane.YZ.offset(-80.5412290745)):
        with BuildLine():
            ThreePointArc((-7.4999998324, -11.9364916298), (-7.0811387155, -10.7117468269), (-6, -10))
            Line((-6, -10), (-7.4999998324, -10))
            Line((-7.4999998324, -10), (-7.4999998324, -11.9364916298))
        make_face()
    extrude(amount=F35_T9_DEPTH, mode=Mode.SUBTRACT)

    # F37
    with Locations(Plane(origin=(0, 17.4999998324, 0), x_dir=(-1, 0, 0), z_dir=(0, 1, 0))):
        with Locations((54.2, 18.7190112229), (72.2, 18.7190112229)):
            CounterSinkHole(F37_D / 2, F37_CSINK_D / 2, depth=F37_DEPTH, counter_sink_angle=F37_CSINK_ANGLE)
            with Locations((0, 0, -(F37_DEPTH + F37_TIP / 2))):  # 118° drill point
                Cone(0, F37_D / 2, F37_TIP, mode=Mode.SUBTRACT)


solid = Compound([f1.part, f9.part, f32.part, f23_2.part])
